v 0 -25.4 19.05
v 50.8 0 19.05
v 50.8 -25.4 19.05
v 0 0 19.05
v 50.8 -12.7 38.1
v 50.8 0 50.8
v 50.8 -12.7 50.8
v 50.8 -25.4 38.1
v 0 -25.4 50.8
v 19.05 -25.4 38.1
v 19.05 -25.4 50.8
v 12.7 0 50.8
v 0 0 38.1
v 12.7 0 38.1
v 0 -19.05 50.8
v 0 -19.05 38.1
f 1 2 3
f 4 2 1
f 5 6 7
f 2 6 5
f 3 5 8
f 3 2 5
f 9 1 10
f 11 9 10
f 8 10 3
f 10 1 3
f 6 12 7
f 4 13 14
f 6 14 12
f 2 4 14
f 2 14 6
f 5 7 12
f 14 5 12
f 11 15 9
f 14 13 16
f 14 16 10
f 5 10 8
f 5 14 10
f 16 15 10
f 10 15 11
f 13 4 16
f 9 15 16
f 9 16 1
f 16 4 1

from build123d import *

# Parameters (mm, degrees)
F0_W     = 50.8
F0_H     = 25.4
F1_DEPTH = 25.4
F3_DEPTH = 25.4
F5_DEPTH = 12.7
F6_W     = 50.8
F6_H     = 19.05
F7_DEPTH = 50.8


with BuildPart() as f1:
    # F0 (on Front) → F1 (new body)
    with BuildSketch(Plane.XZ):
        with Locations((25.4, 12.7)):
            Rectangle(F0_W, F0_H)
    extrude(amount=F1_DEPTH)

    # F3 (add): a face of the model
    f3_faces = [f1.faces().sort_by_distance(p)[0] for p in [
        (25.4, -12.7, 25.4),
    ]]
    extrude(f3_faces, amount=F3_DEPTH)

    # F4 (on face) → F5 (cut)
    with BuildSketch(Plane.XY.offset(50.8)):
        Polygon((50.8, -12.7), (12.7, 0), (0, 0), (0, -19.05), (19.05, -25.4), (50.8, -25.4), align=None)
    extrude(amount=-F5_DEPTH, mode=Mode.SUBTRACT)

    # F6 (on face) → F7 (cut)
    with BuildSketch(Plane(origin=(0, 0, 0), x_dir=(-1, 0, 0), z_dir=(0, 1, 0))):
        with Locations((-25.4, 9.525)):
            Rectangle(F6_W, F6_H)
    extrude(amount=-F7_DEPTH, mode=Mode.SUBTRACT)


solid = f1.part
